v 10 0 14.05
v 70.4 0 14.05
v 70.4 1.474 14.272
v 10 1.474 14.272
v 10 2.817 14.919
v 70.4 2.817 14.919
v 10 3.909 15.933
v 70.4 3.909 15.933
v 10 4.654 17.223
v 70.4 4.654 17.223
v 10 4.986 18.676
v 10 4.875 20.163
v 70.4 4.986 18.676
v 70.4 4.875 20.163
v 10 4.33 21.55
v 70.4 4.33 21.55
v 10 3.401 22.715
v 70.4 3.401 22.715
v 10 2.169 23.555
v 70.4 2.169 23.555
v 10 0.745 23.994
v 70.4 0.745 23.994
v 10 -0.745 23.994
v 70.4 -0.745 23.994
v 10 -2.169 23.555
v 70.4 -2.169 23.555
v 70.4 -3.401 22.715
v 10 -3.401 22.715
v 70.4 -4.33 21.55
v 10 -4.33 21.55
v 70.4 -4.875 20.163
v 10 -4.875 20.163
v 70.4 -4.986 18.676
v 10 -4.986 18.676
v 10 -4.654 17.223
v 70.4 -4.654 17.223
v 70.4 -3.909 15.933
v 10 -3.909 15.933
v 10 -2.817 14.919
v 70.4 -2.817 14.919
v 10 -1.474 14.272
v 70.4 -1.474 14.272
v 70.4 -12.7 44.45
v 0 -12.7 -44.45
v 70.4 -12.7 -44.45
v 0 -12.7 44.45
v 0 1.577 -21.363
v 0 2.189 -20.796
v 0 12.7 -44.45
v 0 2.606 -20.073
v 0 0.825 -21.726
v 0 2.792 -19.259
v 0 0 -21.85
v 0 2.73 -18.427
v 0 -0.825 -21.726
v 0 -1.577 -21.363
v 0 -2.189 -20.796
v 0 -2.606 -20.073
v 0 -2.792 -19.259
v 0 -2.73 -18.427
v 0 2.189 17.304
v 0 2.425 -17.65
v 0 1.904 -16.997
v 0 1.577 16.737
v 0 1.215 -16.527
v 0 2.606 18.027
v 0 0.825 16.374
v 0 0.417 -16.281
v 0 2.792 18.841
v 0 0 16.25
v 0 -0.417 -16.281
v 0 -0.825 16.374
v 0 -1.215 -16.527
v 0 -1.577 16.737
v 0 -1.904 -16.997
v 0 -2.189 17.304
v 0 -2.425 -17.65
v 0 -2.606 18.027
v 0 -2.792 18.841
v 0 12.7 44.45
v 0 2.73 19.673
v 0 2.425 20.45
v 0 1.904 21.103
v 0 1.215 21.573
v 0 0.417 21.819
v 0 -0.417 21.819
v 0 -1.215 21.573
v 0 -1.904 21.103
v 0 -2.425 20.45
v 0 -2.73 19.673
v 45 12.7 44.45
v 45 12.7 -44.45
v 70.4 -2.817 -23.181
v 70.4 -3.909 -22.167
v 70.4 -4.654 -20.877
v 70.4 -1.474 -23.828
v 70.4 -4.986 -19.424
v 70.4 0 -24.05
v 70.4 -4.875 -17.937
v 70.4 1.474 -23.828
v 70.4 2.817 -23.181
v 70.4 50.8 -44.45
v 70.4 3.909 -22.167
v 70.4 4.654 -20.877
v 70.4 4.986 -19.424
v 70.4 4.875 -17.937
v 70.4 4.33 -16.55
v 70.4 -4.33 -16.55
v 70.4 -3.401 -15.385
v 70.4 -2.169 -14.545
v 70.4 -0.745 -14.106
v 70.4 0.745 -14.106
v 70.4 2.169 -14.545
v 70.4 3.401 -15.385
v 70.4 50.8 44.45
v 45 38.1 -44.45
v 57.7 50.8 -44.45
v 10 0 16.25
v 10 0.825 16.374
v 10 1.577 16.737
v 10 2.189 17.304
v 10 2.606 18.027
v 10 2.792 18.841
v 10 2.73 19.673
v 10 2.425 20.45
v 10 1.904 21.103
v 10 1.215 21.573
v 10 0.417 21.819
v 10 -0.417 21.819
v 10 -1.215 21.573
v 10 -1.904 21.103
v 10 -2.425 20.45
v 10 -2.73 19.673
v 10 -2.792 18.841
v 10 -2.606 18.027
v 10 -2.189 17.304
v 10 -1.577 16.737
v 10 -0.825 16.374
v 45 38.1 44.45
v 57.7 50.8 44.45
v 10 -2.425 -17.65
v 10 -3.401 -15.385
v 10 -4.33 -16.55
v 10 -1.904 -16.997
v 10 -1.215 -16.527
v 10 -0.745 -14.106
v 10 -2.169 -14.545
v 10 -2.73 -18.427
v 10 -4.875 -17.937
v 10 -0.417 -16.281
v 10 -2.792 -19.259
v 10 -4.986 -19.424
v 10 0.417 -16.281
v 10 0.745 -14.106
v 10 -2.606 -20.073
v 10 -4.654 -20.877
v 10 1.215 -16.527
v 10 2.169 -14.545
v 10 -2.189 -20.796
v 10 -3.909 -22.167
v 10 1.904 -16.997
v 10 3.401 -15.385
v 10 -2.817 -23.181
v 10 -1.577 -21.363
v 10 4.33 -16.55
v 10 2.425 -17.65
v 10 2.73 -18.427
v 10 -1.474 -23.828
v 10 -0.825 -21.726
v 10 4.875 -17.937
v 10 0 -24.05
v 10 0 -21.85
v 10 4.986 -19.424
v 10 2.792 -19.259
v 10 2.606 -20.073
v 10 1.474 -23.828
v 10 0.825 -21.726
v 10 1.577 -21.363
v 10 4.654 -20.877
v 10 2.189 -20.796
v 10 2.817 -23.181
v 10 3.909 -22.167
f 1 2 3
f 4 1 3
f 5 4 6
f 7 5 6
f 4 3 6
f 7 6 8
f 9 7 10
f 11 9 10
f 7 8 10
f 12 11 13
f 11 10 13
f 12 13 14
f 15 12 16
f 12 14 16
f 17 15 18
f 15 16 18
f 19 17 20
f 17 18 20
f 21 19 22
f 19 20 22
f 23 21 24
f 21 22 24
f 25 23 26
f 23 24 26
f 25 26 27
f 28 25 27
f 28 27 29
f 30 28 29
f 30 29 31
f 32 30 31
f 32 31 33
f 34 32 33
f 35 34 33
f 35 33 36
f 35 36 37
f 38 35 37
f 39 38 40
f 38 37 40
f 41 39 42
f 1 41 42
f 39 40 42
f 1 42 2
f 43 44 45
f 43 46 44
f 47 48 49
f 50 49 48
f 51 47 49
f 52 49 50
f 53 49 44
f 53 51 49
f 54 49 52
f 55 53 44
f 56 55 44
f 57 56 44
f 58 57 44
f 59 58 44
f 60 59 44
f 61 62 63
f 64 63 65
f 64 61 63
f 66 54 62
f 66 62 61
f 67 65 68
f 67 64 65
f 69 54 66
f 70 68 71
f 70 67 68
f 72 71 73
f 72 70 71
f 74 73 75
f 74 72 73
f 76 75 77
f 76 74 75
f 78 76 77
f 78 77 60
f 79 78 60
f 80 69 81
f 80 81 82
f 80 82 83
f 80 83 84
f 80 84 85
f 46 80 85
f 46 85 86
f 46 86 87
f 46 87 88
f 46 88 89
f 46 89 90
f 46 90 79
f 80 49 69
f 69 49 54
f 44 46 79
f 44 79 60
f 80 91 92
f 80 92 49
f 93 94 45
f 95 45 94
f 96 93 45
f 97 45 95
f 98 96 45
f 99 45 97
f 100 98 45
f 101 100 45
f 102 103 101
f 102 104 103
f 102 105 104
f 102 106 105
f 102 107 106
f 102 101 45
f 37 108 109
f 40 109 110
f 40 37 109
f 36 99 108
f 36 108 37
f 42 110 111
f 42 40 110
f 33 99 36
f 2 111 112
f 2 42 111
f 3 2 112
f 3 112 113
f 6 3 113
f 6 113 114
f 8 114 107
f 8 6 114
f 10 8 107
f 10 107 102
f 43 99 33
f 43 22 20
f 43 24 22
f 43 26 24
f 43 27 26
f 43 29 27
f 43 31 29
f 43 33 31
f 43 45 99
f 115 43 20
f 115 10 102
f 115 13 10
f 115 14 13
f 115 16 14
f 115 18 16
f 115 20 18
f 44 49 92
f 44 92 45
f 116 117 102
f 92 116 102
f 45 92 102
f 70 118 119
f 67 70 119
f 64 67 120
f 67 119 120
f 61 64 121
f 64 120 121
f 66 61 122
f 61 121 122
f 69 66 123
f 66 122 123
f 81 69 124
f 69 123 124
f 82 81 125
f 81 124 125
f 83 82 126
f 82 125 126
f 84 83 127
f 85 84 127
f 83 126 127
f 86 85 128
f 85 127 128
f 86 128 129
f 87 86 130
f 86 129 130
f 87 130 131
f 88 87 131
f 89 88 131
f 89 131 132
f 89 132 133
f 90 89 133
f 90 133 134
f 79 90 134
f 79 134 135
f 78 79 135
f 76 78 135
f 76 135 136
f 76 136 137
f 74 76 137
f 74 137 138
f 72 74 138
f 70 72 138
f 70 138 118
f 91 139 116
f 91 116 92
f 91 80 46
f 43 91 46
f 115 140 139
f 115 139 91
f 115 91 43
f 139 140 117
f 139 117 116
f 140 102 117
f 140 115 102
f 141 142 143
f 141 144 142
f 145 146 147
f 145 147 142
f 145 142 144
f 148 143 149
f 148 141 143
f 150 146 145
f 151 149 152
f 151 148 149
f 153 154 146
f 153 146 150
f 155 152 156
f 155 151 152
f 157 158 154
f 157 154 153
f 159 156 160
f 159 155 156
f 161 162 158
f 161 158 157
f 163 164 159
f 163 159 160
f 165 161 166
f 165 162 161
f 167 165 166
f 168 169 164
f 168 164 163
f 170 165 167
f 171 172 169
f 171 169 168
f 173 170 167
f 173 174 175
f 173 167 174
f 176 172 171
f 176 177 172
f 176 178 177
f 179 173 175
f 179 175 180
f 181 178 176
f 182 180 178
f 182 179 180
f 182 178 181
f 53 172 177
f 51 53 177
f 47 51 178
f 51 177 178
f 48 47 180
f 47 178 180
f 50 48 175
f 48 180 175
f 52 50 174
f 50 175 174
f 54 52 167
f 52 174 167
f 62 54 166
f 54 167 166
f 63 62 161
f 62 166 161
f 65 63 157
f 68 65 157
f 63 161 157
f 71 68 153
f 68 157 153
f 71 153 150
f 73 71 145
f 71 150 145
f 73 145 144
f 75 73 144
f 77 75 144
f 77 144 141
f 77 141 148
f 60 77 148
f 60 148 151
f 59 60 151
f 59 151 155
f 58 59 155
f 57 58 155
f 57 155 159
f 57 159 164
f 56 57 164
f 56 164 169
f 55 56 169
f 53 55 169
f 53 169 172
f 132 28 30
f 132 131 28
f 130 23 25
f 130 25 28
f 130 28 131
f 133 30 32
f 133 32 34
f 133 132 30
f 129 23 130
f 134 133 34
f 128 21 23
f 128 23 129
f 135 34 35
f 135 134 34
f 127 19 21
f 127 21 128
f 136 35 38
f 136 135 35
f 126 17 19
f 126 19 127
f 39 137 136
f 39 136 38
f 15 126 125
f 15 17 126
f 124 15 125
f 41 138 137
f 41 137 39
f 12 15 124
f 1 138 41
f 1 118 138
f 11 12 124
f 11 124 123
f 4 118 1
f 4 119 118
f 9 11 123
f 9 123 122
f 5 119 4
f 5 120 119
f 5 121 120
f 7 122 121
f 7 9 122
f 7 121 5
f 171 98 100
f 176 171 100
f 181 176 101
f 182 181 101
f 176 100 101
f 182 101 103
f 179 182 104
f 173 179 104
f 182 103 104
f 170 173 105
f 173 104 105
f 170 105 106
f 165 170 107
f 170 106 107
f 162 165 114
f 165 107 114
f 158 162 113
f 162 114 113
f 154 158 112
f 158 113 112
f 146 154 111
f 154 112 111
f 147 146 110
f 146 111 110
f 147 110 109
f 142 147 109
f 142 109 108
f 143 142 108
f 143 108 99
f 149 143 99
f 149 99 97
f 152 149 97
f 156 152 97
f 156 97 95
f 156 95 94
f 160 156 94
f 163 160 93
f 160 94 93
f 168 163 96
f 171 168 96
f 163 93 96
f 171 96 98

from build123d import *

# Parameters (mm, degrees)
BOSS_EXTRUDE1_DEPTH = 44.45
SKETCH2_R           = 2.8
CUT_EXTRUDE1_DEPTH  = 98.532571483
SKETCH3_R           = 5
CUT_EXTRUDE2_DEPTH  = 60.4


with BuildPart() as part:
    # Sketch1 → Boss-Extrude1 (new, symmetric)
    with BuildSketch(Plane.XY):
        Polygon((70.4, 50.8), (57.7, 50.8), (45, 38.1), (45, 12.7), (0, 12.7), (0, -12.7), (70.4, -12.7), align=None)
    extrude(amount=BOSS_EXTRUDE1_DEPTH, both=True)

    # Sketch2 → Cut-Extrude1 (cut, through all)
    with BuildSketch(Plane(origin=(70.4, 0, 0), x_dir=(0, 0, -1), z_dir=(1, 0, 0))):
        with Locations((-19.05, 0)):
            Circle(SKETCH2_R)
        with Locations((19.05, 0)):
            Circle(SKETCH2_R)
    extrude(amount=-CUT_EXTRUDE1_DEPTH, mode=Mode.SUBTRACT)

    # Sketch3 → Cut-Extrude2 (cut)
    with BuildSketch(Plane(origin=(70.4, 0, 0), x_dir=(0, 0, -1), z_dir=(1, 0, 0))):
        with Locations((-19.05, 0)):
            Circle(SKETCH3_R)
        with Locations((19.05, 0)):
            Circle(SKETCH3_R)
    extrude(amount=-CUT_EXTRUDE2_DEPTH, mode=Mode.SUBTRACT)


solid = part.part
